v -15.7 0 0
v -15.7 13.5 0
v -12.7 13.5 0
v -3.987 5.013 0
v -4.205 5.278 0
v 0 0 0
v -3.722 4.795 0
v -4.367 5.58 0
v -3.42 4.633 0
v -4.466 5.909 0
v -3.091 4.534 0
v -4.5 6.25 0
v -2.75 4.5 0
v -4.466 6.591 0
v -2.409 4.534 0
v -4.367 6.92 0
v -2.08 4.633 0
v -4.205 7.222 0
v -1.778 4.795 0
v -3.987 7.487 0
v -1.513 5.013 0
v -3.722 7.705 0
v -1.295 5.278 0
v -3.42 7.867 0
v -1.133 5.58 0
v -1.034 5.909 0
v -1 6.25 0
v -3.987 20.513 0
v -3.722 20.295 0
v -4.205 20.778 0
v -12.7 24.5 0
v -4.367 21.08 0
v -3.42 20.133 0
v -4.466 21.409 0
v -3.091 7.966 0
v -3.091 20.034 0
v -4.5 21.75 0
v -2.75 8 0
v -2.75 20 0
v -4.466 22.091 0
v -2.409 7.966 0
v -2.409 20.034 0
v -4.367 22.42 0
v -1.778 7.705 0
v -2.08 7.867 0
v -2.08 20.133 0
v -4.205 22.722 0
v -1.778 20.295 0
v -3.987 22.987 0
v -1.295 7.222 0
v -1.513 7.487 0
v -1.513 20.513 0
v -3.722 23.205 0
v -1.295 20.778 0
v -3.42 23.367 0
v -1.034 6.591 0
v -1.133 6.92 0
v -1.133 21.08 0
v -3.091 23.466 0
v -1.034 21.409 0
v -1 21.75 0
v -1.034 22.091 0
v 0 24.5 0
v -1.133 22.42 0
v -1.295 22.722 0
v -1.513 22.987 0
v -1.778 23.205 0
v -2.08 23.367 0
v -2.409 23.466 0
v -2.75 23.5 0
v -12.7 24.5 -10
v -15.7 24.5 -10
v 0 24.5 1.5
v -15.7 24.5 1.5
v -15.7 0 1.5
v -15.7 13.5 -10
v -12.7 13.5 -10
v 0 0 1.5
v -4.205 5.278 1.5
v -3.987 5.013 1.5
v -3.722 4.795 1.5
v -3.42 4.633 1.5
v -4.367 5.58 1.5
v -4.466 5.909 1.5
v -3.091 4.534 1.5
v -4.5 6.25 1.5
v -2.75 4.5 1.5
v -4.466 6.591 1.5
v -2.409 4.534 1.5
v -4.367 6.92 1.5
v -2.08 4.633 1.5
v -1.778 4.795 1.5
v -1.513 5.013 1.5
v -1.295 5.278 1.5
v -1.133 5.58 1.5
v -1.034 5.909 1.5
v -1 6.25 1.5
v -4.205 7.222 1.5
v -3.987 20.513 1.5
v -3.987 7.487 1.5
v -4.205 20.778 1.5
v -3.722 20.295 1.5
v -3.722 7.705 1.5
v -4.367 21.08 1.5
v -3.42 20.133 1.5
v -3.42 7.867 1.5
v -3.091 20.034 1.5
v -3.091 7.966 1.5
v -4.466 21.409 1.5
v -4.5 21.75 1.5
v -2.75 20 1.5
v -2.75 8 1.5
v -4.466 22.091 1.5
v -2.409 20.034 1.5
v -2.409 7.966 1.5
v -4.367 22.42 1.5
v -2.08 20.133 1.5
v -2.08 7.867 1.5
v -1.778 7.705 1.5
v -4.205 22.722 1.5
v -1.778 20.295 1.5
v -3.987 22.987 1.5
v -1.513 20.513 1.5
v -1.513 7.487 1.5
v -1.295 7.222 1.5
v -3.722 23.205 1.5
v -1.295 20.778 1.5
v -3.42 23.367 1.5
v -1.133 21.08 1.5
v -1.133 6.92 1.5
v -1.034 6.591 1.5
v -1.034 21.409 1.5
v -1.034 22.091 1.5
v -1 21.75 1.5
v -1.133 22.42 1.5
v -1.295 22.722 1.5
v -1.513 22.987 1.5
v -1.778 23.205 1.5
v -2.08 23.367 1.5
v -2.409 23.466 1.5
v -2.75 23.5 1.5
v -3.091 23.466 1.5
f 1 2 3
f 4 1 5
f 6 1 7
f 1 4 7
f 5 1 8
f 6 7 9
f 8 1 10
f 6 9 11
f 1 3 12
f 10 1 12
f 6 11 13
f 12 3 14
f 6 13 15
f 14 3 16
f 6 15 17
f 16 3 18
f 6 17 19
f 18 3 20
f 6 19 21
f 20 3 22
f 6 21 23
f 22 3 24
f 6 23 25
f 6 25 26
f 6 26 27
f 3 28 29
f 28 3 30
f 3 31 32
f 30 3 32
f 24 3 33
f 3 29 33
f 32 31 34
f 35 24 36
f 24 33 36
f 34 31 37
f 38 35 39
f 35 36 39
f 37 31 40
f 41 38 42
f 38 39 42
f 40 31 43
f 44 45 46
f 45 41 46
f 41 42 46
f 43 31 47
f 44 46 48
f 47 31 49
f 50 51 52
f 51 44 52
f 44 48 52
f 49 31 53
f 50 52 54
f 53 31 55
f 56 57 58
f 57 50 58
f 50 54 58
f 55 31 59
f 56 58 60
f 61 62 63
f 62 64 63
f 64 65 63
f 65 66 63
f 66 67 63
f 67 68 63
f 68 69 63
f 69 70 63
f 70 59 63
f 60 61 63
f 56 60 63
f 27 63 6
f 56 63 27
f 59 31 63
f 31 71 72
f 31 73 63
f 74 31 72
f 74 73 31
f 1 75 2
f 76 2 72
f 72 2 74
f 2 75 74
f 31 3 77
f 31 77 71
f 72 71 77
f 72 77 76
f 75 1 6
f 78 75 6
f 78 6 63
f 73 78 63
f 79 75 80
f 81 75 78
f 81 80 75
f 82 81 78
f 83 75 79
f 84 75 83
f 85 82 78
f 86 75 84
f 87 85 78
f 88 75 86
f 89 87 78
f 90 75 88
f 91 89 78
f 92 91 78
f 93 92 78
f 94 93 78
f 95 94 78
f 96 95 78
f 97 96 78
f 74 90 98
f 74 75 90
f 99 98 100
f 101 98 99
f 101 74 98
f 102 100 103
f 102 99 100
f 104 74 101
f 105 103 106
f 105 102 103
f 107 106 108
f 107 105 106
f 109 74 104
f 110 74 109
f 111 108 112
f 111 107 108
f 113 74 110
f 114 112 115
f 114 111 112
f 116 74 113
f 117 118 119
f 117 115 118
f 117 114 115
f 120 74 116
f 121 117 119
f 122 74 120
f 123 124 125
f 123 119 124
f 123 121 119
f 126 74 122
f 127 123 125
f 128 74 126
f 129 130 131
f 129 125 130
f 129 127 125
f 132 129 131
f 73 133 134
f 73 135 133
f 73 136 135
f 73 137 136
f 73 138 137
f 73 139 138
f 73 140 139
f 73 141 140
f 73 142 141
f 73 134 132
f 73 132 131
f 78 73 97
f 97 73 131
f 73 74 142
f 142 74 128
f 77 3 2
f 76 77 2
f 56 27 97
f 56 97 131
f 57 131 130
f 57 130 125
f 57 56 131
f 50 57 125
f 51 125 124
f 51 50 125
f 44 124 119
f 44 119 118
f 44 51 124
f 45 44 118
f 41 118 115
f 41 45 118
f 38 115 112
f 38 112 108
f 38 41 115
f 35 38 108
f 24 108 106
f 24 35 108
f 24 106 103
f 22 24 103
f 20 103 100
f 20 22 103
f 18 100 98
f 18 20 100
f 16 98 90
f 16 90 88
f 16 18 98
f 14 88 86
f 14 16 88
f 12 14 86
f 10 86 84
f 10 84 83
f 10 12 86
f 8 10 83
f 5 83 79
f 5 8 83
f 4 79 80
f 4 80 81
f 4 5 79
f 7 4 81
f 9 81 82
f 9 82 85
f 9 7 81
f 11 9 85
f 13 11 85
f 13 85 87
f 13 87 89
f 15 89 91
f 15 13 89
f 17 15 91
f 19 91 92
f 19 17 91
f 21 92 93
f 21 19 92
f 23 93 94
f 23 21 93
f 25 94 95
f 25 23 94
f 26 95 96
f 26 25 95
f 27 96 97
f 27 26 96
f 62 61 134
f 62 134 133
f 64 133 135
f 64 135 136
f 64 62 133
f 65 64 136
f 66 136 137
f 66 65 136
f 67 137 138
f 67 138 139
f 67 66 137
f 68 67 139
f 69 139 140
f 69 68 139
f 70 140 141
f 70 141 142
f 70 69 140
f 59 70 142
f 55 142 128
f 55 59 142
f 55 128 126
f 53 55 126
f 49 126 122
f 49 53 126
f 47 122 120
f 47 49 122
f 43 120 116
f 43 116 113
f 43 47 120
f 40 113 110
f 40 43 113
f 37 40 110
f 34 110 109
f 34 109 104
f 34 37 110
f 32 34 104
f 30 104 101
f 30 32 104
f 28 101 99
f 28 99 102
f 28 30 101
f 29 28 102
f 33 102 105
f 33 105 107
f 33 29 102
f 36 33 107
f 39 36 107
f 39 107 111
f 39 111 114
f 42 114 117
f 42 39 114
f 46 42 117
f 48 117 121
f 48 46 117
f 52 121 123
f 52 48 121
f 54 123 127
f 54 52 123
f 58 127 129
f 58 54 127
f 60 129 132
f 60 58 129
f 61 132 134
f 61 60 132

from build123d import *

# Parameters (mm, degrees)
ESQUISSE1_W        = 15.7
ESQUISSE1_H        = 24.5
ESQUISSE1_R        = 1.75
BOSS_EXTRU_1_DEPTH = 1.5
ESQUISSE2_W        = 3
ESQUISSE2_H        = 11
BOSS_EXTRU_2_DEPTH = 10


with BuildPart() as part:
    # Esquisse1 → Boss.-Extru.1 (new body)
    with BuildSketch(Plane.XY):
        with Locations((-7.85, 12.25)):
            Rectangle(ESQUISSE1_W, ESQUISSE1_H)
        with Locations((-2.75, 21.75)):
            Circle(ESQUISSE1_R, mode=Mode.SUBTRACT)
        with Locations((-2.75, 6.25)):
            Circle(ESQUISSE1_R, mode=Mode.SUBTRACT)
    extrude(amount=BOSS_EXTRU_1_DEPTH)

    # Esquisse2 → Boss.-Extru.2 (add)
    with BuildSketch(Plane(origin=(0, 0, 0), x_dir=(-1, 0, 0), z_dir=(0, 0, -1))):
        with Locations((14.2, 19)):
            Rectangle(ESQUISSE2_W, ESQUISSE2_H)
    extrude(amount=BOSS_EXTRU_2_DEPTH)


solid = part.part
